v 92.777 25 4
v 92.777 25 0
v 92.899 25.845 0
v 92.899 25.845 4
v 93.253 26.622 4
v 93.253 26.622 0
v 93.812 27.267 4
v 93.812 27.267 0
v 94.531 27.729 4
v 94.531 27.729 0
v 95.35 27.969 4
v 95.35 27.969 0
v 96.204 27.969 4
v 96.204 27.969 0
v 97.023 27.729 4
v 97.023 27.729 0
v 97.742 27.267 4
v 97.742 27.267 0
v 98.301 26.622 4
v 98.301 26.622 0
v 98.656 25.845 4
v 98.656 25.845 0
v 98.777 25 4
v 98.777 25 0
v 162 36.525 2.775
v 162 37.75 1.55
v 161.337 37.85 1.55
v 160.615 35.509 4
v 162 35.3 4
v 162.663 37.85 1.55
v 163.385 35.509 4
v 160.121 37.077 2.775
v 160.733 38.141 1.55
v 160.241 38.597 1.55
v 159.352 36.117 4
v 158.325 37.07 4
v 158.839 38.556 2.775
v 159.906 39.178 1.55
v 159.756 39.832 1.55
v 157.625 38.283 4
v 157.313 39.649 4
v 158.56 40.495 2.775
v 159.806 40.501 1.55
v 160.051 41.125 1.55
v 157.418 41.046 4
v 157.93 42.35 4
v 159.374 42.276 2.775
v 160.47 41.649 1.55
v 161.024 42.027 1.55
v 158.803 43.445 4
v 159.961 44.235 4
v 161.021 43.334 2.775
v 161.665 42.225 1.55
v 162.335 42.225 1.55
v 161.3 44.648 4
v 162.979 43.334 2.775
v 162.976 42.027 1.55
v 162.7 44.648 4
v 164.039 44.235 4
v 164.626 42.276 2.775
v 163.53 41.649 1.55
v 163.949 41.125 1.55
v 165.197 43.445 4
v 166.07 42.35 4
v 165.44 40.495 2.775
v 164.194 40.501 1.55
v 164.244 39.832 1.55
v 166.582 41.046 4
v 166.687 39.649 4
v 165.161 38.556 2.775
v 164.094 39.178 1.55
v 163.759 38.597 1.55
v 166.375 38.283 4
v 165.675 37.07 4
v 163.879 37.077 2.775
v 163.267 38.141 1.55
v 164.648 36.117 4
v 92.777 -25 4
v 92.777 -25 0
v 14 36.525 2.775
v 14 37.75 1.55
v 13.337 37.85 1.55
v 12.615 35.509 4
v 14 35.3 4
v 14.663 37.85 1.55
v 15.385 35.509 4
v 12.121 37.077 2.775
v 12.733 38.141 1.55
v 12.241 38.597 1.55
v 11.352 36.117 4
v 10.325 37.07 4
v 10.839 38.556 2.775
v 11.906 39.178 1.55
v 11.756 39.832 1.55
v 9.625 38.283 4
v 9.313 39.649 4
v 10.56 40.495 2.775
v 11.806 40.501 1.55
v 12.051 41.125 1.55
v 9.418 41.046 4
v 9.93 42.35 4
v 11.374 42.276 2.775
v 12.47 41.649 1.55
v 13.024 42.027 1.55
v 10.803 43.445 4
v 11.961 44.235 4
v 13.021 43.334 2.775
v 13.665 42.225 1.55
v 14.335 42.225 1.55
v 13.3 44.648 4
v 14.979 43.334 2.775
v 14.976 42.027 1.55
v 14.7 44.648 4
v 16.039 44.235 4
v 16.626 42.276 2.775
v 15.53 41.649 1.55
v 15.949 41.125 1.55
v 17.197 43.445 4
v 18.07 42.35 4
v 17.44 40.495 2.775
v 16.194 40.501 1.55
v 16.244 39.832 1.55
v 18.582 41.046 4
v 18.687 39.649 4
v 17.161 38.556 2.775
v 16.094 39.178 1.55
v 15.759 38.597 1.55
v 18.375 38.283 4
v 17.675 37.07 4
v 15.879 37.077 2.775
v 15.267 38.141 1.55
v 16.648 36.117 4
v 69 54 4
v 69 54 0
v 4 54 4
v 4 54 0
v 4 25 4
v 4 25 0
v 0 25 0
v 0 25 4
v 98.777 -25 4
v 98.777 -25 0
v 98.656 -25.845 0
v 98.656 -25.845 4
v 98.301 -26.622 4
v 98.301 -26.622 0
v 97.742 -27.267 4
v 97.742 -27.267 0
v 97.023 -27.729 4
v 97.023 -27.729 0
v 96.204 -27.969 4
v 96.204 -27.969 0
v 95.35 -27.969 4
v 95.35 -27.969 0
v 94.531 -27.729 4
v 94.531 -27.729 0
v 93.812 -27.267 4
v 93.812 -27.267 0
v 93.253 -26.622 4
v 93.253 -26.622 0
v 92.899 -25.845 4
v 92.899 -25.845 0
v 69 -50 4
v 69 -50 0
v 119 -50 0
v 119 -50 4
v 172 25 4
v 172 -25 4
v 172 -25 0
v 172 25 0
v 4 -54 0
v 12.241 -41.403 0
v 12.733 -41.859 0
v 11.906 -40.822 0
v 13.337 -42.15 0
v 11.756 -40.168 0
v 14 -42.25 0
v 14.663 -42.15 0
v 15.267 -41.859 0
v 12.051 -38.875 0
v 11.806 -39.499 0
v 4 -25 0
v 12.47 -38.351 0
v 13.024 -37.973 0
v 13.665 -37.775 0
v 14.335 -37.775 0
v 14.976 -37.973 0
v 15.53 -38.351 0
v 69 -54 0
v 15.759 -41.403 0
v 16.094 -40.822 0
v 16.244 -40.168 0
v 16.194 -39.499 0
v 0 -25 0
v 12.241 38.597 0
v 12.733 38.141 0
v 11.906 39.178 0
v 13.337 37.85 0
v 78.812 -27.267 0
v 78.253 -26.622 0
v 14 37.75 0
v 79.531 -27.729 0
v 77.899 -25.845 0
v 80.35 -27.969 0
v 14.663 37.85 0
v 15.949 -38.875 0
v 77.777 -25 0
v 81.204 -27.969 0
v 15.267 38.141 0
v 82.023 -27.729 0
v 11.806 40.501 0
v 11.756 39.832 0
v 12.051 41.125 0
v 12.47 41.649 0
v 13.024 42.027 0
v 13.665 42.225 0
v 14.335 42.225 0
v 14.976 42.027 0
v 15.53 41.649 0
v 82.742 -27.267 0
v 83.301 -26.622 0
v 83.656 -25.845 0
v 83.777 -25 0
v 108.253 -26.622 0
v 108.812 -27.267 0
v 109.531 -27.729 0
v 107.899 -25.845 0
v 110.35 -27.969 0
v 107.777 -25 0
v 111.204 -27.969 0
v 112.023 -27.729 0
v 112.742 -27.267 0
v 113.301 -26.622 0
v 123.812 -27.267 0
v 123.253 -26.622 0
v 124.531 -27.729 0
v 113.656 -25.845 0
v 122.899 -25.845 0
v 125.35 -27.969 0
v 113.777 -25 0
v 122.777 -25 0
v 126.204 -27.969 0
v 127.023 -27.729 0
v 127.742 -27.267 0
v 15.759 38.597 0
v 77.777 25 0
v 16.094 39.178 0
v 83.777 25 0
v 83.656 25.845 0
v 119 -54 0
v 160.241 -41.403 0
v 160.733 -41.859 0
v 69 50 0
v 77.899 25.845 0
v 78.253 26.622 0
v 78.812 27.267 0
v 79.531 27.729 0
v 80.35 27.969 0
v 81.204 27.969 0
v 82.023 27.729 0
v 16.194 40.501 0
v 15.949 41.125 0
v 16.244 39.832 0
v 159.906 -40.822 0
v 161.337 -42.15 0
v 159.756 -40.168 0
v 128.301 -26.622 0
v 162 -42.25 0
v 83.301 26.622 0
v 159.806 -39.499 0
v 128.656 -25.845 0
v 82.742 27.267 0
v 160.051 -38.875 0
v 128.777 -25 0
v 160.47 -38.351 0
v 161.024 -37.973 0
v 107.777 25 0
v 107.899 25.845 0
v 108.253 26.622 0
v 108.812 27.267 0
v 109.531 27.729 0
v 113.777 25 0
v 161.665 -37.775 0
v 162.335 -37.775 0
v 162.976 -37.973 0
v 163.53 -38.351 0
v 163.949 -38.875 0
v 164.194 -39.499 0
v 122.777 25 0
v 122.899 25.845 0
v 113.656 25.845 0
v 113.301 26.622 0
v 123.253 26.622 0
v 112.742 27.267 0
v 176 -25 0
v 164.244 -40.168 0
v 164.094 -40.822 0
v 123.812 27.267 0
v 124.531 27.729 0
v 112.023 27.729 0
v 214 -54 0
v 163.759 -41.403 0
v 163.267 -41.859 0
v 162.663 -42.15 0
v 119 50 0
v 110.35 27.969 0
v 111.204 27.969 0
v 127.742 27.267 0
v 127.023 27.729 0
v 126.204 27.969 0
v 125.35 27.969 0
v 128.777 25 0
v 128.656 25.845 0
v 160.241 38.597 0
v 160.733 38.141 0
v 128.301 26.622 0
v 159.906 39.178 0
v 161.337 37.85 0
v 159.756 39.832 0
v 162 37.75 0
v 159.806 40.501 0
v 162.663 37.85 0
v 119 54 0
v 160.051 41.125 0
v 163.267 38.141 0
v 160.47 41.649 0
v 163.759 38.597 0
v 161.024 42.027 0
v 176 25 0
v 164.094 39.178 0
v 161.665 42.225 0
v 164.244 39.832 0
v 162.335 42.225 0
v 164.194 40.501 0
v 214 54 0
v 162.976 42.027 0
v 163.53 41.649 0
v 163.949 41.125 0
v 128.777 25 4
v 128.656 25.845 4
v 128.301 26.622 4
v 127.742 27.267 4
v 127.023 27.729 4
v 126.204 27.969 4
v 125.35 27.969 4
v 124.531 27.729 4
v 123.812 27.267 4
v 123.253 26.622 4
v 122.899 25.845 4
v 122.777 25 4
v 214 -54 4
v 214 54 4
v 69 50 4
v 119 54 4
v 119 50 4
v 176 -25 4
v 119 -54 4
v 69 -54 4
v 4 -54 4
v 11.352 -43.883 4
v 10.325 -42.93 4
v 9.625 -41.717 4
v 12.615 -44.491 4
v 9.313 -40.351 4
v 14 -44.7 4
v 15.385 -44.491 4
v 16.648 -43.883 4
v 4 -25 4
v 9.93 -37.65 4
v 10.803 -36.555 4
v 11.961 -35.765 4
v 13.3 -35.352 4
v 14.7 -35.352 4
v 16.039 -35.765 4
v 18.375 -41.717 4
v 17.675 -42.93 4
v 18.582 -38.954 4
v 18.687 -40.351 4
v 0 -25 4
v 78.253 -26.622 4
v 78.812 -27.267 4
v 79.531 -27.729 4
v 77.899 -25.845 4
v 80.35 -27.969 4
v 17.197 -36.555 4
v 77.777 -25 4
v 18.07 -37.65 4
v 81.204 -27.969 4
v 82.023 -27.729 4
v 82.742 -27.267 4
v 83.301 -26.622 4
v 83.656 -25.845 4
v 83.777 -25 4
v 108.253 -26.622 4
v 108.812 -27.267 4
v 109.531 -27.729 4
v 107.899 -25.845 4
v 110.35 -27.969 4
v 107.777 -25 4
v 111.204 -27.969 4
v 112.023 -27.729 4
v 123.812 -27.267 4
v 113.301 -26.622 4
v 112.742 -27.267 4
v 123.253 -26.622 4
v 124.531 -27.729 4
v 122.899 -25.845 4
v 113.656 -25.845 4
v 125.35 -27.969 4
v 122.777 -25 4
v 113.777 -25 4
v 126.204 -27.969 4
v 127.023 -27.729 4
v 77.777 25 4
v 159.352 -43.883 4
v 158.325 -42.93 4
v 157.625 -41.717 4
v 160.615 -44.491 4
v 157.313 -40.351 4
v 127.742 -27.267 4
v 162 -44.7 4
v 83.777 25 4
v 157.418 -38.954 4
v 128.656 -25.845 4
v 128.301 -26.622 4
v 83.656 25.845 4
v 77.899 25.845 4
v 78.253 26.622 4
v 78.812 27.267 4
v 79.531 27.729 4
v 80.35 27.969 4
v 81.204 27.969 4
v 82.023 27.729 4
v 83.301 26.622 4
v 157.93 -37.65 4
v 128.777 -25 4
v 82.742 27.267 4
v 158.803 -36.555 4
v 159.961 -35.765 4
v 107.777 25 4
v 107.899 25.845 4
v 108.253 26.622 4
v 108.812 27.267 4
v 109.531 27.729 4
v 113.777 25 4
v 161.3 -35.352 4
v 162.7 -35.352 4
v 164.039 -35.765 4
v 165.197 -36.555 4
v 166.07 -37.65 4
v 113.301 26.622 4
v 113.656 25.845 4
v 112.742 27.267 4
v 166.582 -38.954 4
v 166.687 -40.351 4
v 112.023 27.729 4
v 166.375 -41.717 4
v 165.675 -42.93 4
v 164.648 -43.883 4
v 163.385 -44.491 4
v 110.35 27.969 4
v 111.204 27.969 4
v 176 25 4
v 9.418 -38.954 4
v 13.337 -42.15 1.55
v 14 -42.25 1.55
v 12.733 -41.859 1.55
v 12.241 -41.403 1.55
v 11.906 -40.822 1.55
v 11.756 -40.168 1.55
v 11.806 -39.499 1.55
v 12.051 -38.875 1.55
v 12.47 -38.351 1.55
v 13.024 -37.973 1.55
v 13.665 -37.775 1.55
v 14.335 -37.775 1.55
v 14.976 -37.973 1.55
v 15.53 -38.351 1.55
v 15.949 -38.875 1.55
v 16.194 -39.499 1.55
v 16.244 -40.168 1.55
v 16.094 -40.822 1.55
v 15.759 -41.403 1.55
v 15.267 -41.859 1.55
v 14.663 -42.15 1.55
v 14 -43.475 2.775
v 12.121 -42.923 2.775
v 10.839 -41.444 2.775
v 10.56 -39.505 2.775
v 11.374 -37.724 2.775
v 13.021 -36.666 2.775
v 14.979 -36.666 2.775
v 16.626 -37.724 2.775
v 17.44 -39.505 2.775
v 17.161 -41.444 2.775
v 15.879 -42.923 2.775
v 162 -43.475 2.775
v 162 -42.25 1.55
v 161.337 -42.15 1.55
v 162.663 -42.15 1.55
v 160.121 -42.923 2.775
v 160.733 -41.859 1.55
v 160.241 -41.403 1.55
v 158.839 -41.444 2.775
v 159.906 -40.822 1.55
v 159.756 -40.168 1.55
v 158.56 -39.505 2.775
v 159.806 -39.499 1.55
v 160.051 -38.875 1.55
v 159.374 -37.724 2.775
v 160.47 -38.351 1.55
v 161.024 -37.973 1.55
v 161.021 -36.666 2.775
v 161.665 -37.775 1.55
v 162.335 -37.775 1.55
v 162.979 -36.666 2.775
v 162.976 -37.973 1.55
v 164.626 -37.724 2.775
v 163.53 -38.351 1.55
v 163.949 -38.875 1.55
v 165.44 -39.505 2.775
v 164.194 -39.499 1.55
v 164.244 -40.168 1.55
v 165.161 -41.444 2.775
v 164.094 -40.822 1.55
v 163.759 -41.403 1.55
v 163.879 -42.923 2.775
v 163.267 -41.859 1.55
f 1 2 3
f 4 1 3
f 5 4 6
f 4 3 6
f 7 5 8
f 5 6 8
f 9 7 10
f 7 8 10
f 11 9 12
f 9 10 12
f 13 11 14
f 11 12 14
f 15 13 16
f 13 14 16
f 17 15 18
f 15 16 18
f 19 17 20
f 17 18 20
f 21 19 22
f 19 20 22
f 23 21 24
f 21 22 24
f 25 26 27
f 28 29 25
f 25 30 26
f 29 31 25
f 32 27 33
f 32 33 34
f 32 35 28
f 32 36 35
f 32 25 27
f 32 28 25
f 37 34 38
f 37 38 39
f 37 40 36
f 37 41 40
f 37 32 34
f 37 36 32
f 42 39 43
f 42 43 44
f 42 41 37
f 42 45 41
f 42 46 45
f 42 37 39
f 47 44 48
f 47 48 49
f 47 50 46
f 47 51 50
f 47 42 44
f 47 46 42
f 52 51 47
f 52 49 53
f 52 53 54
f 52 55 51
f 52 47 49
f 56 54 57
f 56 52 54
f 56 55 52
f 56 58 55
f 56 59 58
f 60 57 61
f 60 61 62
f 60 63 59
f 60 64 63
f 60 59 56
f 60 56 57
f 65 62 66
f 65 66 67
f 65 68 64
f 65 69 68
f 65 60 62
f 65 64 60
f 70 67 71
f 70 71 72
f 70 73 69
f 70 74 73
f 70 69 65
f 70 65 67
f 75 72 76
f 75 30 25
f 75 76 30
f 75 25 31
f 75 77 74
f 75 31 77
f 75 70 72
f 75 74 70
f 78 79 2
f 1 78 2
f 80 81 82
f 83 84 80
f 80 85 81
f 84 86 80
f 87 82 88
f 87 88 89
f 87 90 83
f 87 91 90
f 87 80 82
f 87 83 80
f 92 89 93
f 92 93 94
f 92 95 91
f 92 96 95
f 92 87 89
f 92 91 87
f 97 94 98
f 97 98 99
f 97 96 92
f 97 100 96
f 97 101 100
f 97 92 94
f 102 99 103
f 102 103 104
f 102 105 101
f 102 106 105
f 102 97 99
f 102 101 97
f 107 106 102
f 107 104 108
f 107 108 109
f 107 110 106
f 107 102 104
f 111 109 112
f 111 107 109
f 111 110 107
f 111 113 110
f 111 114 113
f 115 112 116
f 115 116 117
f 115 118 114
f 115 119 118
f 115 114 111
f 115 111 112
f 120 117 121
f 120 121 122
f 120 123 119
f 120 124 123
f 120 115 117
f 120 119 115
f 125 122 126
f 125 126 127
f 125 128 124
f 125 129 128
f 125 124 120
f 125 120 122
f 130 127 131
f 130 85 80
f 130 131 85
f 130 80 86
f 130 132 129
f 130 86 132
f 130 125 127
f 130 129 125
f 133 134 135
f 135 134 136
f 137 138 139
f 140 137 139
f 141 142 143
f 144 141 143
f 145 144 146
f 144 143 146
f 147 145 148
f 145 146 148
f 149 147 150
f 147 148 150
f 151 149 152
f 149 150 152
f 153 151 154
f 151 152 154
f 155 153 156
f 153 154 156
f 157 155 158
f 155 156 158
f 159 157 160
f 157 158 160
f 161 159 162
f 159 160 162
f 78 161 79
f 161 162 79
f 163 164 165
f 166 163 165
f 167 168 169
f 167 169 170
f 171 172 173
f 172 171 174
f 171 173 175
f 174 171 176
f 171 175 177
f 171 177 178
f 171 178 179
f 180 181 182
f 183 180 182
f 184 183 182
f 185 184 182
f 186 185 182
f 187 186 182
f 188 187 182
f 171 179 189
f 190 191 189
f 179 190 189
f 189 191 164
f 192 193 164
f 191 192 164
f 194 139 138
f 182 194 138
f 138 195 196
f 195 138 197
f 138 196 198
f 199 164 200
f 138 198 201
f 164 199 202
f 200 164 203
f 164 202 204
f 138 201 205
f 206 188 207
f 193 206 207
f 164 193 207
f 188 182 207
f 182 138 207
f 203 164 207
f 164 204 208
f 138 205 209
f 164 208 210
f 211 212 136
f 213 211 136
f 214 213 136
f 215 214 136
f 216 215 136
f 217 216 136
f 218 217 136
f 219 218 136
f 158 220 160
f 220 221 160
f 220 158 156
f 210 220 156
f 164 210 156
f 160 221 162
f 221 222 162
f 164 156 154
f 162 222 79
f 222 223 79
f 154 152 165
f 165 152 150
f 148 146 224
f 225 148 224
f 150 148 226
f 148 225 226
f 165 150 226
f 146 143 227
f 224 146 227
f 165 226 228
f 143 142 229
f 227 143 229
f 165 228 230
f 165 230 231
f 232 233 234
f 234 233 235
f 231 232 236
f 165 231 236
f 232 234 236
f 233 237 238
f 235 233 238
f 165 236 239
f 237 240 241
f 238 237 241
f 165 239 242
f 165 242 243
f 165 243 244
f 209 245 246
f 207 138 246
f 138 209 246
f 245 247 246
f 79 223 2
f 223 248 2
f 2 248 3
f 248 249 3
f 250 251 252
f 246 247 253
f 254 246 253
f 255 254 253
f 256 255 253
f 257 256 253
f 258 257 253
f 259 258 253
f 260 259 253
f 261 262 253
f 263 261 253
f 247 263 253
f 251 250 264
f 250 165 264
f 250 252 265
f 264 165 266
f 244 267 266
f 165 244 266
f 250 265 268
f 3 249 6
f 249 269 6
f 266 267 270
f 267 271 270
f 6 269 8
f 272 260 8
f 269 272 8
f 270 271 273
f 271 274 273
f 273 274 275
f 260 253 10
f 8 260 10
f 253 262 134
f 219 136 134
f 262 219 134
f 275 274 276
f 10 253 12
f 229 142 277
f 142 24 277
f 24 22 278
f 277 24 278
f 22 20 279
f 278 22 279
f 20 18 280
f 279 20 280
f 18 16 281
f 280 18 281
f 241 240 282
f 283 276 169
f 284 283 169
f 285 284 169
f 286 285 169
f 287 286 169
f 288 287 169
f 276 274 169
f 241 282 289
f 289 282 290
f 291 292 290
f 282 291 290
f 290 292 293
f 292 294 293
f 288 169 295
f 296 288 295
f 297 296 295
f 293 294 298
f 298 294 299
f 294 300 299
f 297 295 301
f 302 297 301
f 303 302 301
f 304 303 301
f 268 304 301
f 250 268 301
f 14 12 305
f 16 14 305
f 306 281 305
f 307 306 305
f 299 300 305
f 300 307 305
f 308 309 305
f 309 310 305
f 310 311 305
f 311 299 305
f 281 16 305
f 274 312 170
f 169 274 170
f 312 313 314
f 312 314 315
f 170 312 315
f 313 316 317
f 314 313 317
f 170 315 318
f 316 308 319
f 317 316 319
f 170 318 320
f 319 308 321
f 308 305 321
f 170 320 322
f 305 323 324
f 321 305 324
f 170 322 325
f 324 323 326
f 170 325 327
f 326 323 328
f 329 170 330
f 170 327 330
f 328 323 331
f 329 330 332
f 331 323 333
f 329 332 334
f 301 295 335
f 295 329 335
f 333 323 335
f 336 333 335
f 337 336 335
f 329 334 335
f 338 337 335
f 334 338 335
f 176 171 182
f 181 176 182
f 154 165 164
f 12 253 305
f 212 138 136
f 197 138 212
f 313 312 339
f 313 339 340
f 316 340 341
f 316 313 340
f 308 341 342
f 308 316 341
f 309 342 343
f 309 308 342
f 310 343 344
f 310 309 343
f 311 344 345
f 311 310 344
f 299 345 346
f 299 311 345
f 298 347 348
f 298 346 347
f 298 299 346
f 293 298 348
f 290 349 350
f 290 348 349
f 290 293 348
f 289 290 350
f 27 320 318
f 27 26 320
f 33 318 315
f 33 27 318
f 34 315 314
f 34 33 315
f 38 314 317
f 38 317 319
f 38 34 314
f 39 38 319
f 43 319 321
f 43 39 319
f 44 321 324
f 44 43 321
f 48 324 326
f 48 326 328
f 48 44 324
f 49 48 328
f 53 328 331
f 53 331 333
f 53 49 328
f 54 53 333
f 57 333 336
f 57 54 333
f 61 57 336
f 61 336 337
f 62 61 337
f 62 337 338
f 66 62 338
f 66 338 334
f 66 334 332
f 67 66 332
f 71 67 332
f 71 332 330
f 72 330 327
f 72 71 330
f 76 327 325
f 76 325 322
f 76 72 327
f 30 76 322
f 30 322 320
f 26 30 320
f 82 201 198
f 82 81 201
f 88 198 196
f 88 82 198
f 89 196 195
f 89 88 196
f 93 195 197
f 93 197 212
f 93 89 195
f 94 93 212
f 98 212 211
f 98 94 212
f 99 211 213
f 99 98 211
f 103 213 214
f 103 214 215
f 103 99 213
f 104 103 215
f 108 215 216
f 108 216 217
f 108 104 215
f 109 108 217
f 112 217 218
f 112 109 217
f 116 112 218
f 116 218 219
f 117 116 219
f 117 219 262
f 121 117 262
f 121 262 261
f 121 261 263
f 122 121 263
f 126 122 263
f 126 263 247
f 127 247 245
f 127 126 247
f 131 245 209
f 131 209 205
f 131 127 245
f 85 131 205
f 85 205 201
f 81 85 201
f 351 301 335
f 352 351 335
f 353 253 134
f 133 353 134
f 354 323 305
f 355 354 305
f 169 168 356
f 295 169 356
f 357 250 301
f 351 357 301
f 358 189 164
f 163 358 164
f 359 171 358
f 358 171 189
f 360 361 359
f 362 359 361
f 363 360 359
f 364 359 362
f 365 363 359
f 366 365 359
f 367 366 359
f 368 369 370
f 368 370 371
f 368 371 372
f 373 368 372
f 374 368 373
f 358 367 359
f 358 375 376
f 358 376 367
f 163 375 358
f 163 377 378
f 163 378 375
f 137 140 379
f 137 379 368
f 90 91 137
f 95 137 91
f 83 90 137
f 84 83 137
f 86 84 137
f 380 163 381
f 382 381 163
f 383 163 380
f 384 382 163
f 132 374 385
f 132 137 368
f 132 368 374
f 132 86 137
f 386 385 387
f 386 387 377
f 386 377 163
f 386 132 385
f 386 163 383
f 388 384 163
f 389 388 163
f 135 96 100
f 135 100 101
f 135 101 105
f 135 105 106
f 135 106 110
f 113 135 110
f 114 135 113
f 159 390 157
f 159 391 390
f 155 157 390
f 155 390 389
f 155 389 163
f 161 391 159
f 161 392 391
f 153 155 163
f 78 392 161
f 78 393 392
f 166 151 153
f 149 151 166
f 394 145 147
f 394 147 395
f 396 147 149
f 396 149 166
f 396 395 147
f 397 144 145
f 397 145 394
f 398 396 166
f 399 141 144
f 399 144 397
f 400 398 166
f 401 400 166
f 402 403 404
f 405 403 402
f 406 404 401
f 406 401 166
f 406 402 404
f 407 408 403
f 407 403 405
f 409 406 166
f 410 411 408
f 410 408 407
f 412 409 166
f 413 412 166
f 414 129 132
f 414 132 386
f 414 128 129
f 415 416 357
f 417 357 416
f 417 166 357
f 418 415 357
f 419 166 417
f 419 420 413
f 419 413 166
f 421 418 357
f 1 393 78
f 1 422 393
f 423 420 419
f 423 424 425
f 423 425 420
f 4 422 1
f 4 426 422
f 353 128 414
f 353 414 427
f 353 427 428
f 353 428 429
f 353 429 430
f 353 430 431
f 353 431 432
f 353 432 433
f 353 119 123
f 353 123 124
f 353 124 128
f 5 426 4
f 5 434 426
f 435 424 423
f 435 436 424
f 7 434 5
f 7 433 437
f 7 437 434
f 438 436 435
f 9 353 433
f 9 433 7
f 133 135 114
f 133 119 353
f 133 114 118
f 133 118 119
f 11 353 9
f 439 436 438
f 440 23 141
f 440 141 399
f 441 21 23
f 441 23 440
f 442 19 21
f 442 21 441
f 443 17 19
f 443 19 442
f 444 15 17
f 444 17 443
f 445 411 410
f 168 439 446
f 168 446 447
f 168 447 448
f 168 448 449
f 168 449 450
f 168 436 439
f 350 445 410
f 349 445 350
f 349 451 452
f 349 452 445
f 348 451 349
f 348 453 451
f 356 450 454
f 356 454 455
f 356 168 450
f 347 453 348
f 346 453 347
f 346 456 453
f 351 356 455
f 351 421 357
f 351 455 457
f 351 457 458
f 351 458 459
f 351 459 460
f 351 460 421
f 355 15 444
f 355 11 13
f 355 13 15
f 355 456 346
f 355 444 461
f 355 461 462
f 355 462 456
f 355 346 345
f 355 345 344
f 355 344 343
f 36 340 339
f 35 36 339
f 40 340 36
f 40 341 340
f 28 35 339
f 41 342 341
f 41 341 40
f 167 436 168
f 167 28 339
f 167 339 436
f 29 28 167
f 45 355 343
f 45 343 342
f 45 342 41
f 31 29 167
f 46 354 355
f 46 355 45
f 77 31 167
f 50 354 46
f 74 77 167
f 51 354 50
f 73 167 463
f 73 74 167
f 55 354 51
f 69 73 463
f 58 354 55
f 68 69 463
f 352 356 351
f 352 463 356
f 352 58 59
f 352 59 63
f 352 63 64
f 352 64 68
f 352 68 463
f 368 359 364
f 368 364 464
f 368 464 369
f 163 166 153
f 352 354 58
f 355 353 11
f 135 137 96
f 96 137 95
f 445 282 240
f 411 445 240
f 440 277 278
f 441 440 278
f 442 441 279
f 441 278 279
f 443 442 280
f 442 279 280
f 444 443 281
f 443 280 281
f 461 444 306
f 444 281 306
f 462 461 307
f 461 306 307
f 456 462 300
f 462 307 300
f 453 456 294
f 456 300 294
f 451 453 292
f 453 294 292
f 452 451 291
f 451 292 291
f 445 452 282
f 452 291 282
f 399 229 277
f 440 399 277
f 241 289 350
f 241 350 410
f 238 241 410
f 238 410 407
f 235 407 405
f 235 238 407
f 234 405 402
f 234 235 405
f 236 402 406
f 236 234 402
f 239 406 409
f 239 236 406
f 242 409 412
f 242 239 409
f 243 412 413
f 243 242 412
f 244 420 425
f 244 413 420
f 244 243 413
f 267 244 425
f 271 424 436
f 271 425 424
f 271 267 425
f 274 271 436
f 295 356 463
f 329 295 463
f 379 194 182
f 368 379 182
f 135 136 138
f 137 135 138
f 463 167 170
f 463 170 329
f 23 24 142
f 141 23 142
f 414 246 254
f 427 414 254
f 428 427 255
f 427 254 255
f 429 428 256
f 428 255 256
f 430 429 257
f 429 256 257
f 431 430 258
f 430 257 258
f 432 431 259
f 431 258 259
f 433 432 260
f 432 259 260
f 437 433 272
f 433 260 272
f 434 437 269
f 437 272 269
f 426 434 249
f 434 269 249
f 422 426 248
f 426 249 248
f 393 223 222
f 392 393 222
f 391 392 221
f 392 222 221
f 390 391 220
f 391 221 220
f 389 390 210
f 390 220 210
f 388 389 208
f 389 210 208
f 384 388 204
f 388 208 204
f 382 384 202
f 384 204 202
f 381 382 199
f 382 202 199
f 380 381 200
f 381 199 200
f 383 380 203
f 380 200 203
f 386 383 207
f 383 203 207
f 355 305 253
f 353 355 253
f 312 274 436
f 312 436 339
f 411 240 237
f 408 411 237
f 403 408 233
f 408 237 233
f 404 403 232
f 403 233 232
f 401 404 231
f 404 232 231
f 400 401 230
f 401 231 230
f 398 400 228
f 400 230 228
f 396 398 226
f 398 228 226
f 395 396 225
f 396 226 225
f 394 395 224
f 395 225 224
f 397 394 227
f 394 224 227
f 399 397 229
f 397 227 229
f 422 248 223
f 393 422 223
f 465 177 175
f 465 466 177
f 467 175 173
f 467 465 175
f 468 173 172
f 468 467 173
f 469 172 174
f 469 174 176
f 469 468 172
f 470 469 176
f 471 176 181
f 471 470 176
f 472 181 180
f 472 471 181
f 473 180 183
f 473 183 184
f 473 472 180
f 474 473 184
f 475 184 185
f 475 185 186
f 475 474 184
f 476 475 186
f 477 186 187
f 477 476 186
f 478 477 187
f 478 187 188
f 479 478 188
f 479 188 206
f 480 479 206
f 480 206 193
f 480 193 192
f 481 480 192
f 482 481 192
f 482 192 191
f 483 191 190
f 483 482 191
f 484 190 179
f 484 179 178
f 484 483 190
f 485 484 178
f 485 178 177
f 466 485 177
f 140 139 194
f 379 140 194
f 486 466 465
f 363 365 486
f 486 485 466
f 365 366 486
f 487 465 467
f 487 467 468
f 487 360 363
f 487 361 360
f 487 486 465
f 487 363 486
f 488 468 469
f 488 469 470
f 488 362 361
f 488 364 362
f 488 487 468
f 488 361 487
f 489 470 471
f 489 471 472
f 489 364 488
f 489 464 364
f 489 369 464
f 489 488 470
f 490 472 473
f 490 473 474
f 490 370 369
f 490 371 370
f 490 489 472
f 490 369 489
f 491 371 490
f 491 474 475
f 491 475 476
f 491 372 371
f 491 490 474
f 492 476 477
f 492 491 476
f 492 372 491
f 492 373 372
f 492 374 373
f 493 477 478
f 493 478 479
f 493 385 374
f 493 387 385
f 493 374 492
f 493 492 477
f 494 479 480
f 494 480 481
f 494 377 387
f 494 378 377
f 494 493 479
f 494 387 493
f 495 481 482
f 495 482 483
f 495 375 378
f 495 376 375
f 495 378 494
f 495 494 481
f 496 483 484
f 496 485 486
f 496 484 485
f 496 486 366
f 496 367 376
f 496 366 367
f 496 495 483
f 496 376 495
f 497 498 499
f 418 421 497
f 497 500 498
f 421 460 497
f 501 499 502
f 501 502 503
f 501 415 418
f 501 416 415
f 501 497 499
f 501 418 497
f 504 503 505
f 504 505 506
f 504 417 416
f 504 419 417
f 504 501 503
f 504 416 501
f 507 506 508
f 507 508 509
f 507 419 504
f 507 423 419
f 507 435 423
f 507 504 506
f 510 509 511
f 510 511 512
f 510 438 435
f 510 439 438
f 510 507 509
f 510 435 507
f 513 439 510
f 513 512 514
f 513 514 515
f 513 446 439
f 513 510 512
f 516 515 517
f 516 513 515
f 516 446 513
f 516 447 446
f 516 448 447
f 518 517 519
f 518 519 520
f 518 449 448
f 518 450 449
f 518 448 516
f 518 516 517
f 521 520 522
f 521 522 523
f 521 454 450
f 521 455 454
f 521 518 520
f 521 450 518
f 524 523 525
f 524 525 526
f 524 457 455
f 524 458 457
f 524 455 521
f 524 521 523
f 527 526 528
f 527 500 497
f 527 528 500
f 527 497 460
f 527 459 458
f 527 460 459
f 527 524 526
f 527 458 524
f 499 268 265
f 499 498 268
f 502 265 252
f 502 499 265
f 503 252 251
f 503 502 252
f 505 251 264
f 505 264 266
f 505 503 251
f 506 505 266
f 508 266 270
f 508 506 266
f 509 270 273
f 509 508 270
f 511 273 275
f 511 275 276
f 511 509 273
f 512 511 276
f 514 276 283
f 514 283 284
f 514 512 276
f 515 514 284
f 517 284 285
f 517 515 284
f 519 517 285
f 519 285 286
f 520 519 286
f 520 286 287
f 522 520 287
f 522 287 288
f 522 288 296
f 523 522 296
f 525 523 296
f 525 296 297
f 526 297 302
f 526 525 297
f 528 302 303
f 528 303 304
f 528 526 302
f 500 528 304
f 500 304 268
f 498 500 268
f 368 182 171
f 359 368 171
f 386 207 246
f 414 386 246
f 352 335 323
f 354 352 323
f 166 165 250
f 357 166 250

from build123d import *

# Parameters (mm, degrees)
BOSS_EXTRUDE1_DEPTH                          = 4
CUT_EXTRUDE1_REACH                           = 222.744
SKETCH2_W                                    = 4
SKETCH2_H                                    = 50
CSK_FOR_M4_COUNTERSUNK_FLAT_HEAD_SCR_2_COUNT = 2
CSK_FOR_M4_COUNTERSUNK_FLAT_HEAD_SCR_2_PITCH = 148
CSK_FOR_M4_COUNTERSUNK_FLAT_HEAD_SCR_3_COUNT = 2
CSK_FOR_M4_COUNTERSUNK_FLAT_HEAD_SCR_3_PITCH = 168.237926759
CSK_FOR_M4_COUNTERSUNK_FLAT_HEAD_SCR_4_COUNT = 2
CSK_FOR_M4_COUNTERSUNK_FLAT_HEAD_SCR_4_PITCH = 80
CUT_EXTRUDE2_REACH                           = 222.744


with BuildPart() as part:
    # Sketch1 → Boss-Extrude1 (new body)
    with BuildSketch(Plane.XY):
        Polygon((0, 25), (0, 0), (214, 0), (214, 54), (119, 54), (119, 50), (69, 50), (69, 54), (4, 54), (4, 25), align=None)
        Polygon((0, 0), (0, -25), (4, -25), (4, -54), (69, -54), (69, -50), (119, -50), (119, -54), (214, -54), (214, 0), align=None)
    extrude(amount=BOSS_EXTRUDE1_DEPTH)

    # Sketch2 → Cut-Extrude1 (cut, up to next)
    with BuildSketch(Plane.XY.offset(4), mode=Mode.PRIVATE) as cut_extrude1_sk1:
        with Locations((174, 0)):
            Rectangle(SKETCH2_W, SKETCH2_H)
    cut_extrude1_tool1 = extrude(cut_extrude1_sk1.sketch, amount=-CUT_EXTRUDE1_REACH, mode=Mode.PRIVATE) & part.part
    add(cut_extrude1_tool1.solids().sort_by_distance((174, 0, 4))[0], mode=Mode.SUBTRACT)

    # Sketch4 → CSK for M4 Countersunk Flat Head Screw1 (revolve, cut)
    with BuildSketch(Plane(origin=(14, 40, 4), x_dir=(0, -1, 0), z_dir=(1, 0, 0))):
        Polygon((0, 0), (0, 4), (2.25, 4), (2.25, 2.45), (4.7, 0), align=None)
    csk_for_m4_countersunk_flat_head_screw1 = revolve(axis=Axis((14, 40, 10.35), (0, 0, -1)), mode=Mode.SUBTRACT)

    # CSK for M4 Countersunk Flat Head Scr 2: CSK for M4 Countersunk Flat Head Screw1 ×2
    with Locations(*[(i * CSK_FOR_M4_COUNTERSUNK_FLAT_HEAD_SCR_2_PITCH, 0, 0) for i in range(1, CSK_FOR_M4_COUNTERSUNK_FLAT_HEAD_SCR_2_COUNT)]):
        add(csk_for_m4_countersunk_flat_head_screw1, mode=Mode.SUBTRACT)

    # CSK for M4 Countersunk Flat Head Scr 3: CSK for M4 Countersunk Flat Head Screw1 ×2
    with Locations(*[Vector(0.8797065135761271, -0.47551703436547405, 0) * (i * CSK_FOR_M4_COUNTERSUNK_FLAT_HEAD_SCR_3_PITCH) for i in range(1, CSK_FOR_M4_COUNTERSUNK_FLAT_HEAD_SCR_3_COUNT)]):
        add(csk_for_m4_countersunk_flat_head_screw1, mode=Mode.SUBTRACT)

    # CSK for M4 Countersunk Flat Head Scr 4: CSK for M4 Countersunk Flat Head Screw1 ×2
    with Locations(*[(0, -i * CSK_FOR_M4_COUNTERSUNK_FLAT_HEAD_SCR_4_PITCH, 0) for i in range(1, CSK_FOR_M4_COUNTERSUNK_FLAT_HEAD_SCR_4_COUNT)]):
        add(csk_for_m4_countersunk_flat_head_screw1, mode=Mode.SUBTRACT)

    # Sketch5 → Cut-Extrude2 (cut, up to next)
    with BuildSketch(Plane(origin=(0, 0, 0), x_dir=(-1, 0, 0), z_dir=(0, 0, -1)), mode=Mode.PRIVATE) as cut_extrude2_sk1:
        with BuildLine():
            Line((-122.777043469, 25), (-122.777043469, -25))
            ThreePointArc((-122.777043469, -25), (-125.777043469, -28), (-128.777043469, -25))
            Line((-128.777043469, -25), (-128.777043469, 25))
            ThreePointArc((-128.777043469, 25), (-125.777043469, 28), (-122.777043469, 25))
        make_face()
    cut_extrude2_tool1 = extrude(cut_extrude2_sk1.sketch, amount=-CUT_EXTRUDE2_REACH, mode=Mode.PRIVATE) & part.part
    # Sketch5 → Cut-Extrude2 (cut, up to next)
    with BuildSketch(Plane(origin=(0, 0, 0), x_dir=(-1, 0, 0), z_dir=(0, 0, -1)), mode=Mode.PRIVATE) as cut_extrude2_sk2:
        with BuildLine():
            Line((-113.777043469, 25), (-113.777043469, -25))
            ThreePointArc((-113.777043469, -25), (-110.777043469, -28), (-107.777043469, -25))
            Line((-107.777043469, -25), (-107.777043469, 25))
            ThreePointArc((-107.777043469, 25), (-110.777043469, 28), (-113.777043469, 25))
        make_face()
    cut_extrude2_tool2 = extrude(cut_extrude2_sk2.sketch, amount=-CUT_EXTRUDE2_REACH, mode=Mode.PRIVATE) & part.part
    # Sketch5 → Cut-Extrude2 (cut, up to next)
    with BuildSketch(Plane(origin=(0, 0, 0), x_dir=(-1, 0, 0), z_dir=(0, 0, -1)), mode=Mode.PRIVATE) as cut_extrude2_sk3:
        with BuildLine():
            Line((-98.777043469, 25), (-98.777043469, -25))
            ThreePointArc((-98.777043469, -25), (-95.777043469, -28), (-92.777043469, -25))
            Line((-92.777043469, -25), (-92.777043469, 25))
            ThreePointArc((-92.777043469, 25), (-95.777043469, 28), (-98.777043469, 25))
        make_face()
    cut_extrude2_tool3 = extrude(cut_extrude2_sk3.sketch, amount=-CUT_EXTRUDE2_REACH, mode=Mode.PRIVATE) & part.part
    # Sketch5 → Cut-Extrude2 (cut, up to next)
    with BuildSketch(Plane(origin=(0, 0, 0), x_dir=(-1, 0, 0), z_dir=(0, 0, -1)), mode=Mode.PRIVATE) as cut_extrude2_sk4:
        with BuildLine():
            Line((-83.777043469, 25), (-83.777043469, -25))
            ThreePointArc((-83.777043469, -25), (-80.777043469, -28), (-77.777043469, -25))
            Line((-77.777043469, -25), (-77.777043469, 25))
            ThreePointArc((-77.777043469, 25), (-80.777043469, 28), (-83.777043469, 25))
        make_face()
    cut_extrude2_tool4 = extrude(cut_extrude2_sk4.sketch, amount=-CUT_EXTRUDE2_REACH, mode=Mode.PRIVATE) & part.part
    add(cut_extrude2_tool1.solids().sort_by_distance((125.777043, 0, 0))[0], mode=Mode.SUBTRACT)
    add(cut_extrude2_tool2.solids().sort_by_distance((110.777043, 0, 0))[0], mode=Mode.SUBTRACT)
    add(cut_extrude2_tool3.solids().sort_by_distance((95.777043, 0, 0))[0], mode=Mode.SUBTRACT)
    add(cut_extrude2_tool4.solids().sort_by_distance((80.777043, 0, 0))[0], mode=Mode.SUBTRACT)


solid = part.part
